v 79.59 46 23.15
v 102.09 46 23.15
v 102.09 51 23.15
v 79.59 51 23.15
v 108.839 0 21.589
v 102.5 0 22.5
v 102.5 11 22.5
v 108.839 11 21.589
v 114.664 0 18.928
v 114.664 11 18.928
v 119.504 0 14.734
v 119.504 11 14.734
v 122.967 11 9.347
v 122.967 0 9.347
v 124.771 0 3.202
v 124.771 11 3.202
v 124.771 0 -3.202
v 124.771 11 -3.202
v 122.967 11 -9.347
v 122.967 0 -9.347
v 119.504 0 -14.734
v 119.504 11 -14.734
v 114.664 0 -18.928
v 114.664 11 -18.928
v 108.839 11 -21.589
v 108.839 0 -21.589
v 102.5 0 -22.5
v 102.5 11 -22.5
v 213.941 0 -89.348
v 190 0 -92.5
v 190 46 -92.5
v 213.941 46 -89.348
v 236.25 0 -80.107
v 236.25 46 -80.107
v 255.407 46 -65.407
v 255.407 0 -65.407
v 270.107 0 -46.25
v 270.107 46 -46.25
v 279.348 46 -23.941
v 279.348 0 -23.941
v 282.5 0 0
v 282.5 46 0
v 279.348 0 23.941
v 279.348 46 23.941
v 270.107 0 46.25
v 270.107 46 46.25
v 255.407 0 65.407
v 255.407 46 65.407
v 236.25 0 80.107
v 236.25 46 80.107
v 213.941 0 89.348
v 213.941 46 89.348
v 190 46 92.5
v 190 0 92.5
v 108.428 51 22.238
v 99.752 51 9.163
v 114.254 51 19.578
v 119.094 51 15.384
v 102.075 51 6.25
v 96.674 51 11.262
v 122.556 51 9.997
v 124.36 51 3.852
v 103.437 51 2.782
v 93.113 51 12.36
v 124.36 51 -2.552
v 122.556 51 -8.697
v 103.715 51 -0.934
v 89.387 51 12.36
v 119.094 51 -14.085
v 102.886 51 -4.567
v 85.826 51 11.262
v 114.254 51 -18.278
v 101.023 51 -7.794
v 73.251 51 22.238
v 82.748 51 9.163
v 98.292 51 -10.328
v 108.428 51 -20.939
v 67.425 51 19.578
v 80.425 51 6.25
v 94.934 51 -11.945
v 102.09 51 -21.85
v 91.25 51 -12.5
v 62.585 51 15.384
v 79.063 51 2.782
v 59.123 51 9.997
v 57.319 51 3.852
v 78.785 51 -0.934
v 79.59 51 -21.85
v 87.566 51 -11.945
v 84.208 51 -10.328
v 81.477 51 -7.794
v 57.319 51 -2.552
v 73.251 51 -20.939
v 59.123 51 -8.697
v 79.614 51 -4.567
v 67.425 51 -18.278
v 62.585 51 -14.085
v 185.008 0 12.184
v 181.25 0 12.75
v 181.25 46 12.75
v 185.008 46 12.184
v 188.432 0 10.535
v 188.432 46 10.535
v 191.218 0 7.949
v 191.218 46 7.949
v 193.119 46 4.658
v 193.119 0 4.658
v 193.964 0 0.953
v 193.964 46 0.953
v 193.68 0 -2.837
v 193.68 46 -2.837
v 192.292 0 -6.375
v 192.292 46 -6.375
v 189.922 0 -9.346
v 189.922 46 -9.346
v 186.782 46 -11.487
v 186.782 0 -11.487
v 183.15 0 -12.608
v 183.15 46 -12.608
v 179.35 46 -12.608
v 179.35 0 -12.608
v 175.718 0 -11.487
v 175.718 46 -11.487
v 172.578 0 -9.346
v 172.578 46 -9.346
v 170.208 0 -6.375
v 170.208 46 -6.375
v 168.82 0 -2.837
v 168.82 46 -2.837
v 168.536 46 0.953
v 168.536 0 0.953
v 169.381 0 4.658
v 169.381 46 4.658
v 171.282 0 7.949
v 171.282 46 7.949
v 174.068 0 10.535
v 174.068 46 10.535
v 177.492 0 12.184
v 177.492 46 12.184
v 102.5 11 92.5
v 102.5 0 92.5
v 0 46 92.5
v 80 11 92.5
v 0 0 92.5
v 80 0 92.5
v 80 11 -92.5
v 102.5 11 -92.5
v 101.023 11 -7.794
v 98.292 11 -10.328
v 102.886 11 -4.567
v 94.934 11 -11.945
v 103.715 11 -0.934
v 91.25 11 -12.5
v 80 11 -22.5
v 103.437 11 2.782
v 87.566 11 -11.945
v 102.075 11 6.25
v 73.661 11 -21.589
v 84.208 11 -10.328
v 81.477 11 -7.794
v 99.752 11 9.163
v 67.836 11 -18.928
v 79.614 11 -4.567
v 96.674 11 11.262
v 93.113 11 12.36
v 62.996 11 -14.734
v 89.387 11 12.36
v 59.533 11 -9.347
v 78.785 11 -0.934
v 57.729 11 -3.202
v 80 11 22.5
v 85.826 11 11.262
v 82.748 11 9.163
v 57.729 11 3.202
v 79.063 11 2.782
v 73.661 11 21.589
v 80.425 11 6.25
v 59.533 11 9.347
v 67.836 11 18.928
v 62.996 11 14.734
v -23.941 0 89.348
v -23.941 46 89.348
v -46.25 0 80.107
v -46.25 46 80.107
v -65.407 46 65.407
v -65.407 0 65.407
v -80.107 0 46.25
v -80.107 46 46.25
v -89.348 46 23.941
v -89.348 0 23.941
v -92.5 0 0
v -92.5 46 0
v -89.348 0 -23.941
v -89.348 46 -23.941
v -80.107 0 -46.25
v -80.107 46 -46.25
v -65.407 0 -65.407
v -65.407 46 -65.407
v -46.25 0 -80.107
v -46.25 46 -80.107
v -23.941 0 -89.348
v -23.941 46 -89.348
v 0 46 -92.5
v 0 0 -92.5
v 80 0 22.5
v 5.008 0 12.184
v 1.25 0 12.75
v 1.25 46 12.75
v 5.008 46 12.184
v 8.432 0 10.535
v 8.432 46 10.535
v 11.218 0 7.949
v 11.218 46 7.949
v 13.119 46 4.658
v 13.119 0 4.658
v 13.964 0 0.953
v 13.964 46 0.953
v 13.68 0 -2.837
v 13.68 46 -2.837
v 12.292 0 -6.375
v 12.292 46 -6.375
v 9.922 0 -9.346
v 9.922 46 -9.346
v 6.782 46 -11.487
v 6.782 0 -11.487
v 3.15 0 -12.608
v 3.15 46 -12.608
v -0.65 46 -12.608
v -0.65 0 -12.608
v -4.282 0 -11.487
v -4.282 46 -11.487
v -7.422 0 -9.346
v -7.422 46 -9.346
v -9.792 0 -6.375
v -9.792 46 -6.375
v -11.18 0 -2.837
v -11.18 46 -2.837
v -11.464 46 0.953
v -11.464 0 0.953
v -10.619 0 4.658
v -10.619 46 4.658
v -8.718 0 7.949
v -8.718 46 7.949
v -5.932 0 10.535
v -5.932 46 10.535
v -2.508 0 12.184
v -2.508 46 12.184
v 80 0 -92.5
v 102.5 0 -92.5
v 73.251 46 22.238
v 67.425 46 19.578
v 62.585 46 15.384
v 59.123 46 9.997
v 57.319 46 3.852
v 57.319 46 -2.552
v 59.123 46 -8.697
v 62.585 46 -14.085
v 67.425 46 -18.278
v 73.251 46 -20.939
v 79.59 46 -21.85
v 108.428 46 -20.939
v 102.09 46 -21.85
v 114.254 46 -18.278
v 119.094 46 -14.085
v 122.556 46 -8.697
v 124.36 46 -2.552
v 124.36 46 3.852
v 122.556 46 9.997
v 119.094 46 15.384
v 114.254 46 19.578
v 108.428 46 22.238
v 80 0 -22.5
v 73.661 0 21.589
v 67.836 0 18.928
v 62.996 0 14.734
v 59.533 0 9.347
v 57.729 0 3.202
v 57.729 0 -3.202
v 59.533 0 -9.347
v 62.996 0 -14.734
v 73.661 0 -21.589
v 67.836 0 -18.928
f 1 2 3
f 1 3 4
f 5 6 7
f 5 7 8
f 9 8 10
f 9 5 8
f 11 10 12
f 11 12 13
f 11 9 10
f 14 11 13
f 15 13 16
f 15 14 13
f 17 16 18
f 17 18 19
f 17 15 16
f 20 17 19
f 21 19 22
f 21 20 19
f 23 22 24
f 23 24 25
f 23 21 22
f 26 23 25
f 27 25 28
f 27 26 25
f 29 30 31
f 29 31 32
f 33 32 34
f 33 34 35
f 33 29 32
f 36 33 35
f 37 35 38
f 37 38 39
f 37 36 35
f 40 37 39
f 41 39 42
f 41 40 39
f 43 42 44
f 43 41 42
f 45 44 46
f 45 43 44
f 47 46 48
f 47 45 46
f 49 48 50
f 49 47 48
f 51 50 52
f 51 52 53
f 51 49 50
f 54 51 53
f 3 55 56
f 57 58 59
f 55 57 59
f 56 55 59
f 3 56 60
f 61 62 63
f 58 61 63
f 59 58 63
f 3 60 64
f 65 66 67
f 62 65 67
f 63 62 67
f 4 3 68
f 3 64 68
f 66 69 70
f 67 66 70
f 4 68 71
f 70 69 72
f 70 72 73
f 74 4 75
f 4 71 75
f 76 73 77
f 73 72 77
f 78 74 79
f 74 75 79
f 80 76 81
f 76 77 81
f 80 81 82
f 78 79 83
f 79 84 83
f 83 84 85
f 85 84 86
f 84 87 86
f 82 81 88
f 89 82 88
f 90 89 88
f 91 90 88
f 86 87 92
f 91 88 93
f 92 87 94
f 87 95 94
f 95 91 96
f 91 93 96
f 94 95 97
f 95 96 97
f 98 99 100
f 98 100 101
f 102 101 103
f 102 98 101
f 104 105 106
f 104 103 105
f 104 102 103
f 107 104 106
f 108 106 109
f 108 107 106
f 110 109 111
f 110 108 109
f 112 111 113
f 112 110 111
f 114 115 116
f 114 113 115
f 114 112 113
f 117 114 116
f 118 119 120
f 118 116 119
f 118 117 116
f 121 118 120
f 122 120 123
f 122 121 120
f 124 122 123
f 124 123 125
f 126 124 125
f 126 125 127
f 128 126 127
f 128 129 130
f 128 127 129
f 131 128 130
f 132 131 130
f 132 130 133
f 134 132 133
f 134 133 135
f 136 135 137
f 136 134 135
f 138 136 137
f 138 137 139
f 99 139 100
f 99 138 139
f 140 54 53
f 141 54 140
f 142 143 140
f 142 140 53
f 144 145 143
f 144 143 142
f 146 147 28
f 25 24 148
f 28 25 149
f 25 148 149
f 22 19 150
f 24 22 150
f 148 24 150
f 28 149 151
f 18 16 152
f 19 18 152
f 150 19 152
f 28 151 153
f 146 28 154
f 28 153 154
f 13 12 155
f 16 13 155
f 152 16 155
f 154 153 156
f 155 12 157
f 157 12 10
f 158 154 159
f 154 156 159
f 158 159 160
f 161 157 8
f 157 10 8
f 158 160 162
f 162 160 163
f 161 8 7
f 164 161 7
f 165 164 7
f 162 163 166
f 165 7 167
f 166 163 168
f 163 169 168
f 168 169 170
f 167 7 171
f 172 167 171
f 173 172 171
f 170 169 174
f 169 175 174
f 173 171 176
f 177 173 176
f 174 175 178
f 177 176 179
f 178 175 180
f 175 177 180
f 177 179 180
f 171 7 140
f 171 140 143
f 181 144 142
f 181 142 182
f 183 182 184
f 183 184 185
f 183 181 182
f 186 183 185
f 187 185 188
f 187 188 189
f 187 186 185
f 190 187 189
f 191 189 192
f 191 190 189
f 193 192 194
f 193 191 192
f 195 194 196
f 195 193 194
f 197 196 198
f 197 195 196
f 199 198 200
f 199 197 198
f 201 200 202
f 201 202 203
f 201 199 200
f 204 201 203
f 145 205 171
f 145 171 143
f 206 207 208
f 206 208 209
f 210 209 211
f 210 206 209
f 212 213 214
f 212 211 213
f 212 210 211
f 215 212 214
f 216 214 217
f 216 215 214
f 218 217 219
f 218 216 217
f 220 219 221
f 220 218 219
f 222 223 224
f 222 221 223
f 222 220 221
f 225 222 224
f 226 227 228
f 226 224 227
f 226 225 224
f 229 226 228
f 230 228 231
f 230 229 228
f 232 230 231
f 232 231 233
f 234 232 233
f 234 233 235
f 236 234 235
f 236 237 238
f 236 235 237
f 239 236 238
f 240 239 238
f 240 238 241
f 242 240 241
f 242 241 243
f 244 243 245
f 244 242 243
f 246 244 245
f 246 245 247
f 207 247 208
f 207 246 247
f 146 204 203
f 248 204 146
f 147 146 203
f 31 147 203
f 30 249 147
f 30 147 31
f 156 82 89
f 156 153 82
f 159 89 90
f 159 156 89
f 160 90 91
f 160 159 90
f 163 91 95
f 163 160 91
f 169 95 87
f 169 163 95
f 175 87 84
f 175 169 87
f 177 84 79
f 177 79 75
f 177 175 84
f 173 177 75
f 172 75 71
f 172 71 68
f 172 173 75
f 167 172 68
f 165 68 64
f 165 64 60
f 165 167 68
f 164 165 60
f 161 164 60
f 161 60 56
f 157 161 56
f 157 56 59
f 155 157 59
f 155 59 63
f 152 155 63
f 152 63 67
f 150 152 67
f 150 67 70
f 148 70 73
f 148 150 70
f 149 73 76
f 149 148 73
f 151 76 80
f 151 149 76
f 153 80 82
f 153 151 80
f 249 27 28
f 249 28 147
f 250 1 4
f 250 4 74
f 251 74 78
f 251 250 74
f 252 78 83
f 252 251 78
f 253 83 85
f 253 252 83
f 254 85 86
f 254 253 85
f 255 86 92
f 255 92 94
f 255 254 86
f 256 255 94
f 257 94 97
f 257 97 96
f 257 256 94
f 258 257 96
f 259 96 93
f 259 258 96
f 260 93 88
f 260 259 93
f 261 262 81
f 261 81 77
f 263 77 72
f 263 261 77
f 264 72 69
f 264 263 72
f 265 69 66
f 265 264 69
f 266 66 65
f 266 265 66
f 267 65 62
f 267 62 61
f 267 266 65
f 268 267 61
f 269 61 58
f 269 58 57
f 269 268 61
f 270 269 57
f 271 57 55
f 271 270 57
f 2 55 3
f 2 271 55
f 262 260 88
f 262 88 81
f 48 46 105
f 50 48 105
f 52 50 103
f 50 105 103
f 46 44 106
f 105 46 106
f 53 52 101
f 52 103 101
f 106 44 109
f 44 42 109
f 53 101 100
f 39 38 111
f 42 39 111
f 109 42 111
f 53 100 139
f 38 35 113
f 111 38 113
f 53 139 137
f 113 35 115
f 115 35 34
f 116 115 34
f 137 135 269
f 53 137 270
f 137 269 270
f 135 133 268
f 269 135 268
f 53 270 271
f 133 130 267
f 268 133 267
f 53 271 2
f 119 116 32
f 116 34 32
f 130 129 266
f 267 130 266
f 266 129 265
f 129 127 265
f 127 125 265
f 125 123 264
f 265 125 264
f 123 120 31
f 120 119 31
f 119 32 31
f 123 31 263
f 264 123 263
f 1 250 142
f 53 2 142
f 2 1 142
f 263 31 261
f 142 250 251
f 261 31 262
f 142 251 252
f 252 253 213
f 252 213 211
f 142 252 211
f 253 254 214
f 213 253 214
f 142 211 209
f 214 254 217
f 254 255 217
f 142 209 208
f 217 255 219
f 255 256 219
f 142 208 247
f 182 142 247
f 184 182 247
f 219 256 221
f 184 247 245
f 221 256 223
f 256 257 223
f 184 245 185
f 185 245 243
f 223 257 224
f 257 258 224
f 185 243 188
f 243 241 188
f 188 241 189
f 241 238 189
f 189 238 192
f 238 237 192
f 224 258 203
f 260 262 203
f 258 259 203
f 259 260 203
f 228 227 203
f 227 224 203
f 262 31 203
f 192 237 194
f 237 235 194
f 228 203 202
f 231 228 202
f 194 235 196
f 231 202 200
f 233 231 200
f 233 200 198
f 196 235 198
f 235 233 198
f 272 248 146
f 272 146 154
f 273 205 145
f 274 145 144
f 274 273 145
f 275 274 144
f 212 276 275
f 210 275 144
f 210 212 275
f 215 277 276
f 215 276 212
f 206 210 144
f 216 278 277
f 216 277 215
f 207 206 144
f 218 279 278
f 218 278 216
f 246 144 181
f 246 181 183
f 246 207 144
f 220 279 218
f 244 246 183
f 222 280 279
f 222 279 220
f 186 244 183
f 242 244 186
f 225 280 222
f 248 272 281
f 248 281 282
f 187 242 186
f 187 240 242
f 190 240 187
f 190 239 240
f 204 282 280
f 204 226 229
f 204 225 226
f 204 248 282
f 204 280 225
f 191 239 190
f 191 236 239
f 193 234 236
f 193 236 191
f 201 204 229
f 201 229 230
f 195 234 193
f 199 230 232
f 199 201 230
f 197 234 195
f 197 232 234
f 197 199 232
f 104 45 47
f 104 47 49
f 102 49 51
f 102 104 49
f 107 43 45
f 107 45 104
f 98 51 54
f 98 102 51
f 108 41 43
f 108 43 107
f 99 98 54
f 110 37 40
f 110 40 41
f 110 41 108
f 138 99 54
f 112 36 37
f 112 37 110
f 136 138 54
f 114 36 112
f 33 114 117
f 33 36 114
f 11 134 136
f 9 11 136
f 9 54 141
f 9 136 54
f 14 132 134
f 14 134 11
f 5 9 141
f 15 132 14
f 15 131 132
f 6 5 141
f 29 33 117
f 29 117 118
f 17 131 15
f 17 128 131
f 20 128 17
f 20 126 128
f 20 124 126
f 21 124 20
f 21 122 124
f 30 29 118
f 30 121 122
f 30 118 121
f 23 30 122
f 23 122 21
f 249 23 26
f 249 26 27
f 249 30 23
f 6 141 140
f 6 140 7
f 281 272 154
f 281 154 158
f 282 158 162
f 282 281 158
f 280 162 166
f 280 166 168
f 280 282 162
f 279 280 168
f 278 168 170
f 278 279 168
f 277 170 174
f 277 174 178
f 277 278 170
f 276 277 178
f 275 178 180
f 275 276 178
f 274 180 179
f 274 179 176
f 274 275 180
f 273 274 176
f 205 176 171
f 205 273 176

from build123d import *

# Parameters (mm, degrees)
BOSS_EXTRUDE1_DEPTH     = 46
CUT_EXTRUDE1_DEPTH      = 11
SKETCH3_R               = 12.5
CUT_EXTRUDE2_DEPTH      = 300.311710429
SKETCH4_R               = 12.5
BOSS_EXTRUDE2_DEPTH     = 5
CUT_EXTRUDE3_DEPTH      = 301.796442798
CUT_EXTRUDE3_DEPTH_BACK = 301.796442798
SKETCH5_R               = 12.75


with BuildPart() as part:
    # Sketch1 → Boss-Extrude1 (new body)
    with BuildSketch(Plane(origin=(0, 0, 0), x_dir=(1, 0, 0), z_dir=(0, 1, 0))):
        with BuildLine():
            Line((0, 92.5), (190, 92.5))
            ThreePointArc((190, 92.5), (282.5, 0), (190, -92.5))
            Line((190, -92.5), (0, -92.5))
            ThreePointArc((0, -92.5), (-92.5, 0), (0, 92.5))
        make_face()
    extrude(amount=BOSS_EXTRUDE1_DEPTH)

    # Sketch2 → Cut-Extrude1 (cut)
    with BuildSketch(Plane.XZ):
        with BuildLine():
            Line((80, -92.5), (80, -22.5))
            ThreePointArc((80, -22.5), (57.5, 0), (80, 22.5))
            Line((80, 22.5), (80, 92.5))
            Line((80, 92.5), (102.5, 92.5))
            Line((102.5, 92.5), (102.5, 22.5))
            ThreePointArc((102.5, 22.5), (125, 0), (102.5, -22.5))
            Line((102.5, -22.5), (102.5, -92.5))
            Line((102.5, -92.5), (80, -92.5))
        make_face()
    extrude(amount=-CUT_EXTRUDE1_DEPTH, mode=Mode.SUBTRACT)

    # Sketch3 → Cut-Extrude2 (cut, through all)
    with BuildSketch(Plane.XZ.offset(-11)):
        with Locations(Location((91.25, 0, 0), (0, 0, 270))):
            Circle(SKETCH3_R)
    extrude(amount=-CUT_EXTRUDE2_DEPTH, mode=Mode.SUBTRACT)

    # Sketch4 → Boss-Extrude2 (add)
    with BuildSketch(Plane(origin=(0, 46, 0), x_dir=(1, 0, 0), z_dir=(0, 1, 0))):
        with BuildLine():
            ThreePointArc((102.089515, 21.8501808), (124.589515, -0.6498192), (102.089515, -23.1498192))
            Line((102.089515, -23.1498192), (79.589515, -23.1498192))
            ThreePointArc((79.589515, -23.1498192), (57.089515, -0.6498192), (79.589515, 21.8501808))
            Line((79.589515, 21.8501808), (102.089515, 21.8501808))
        make_face()
        with Locations(Location((91.25, 0, 0), (0, 0, 90))):
            Circle(SKETCH4_R, mode=Mode.SUBTRACT)
    extrude(amount=BOSS_EXTRUDE2_DEPTH)

    # Sketch5 → Cut-Extrude3 (cut, two sides: drawn at the far end of the back side and taken through both)
    with BuildSketch(Plane(origin=(0, 46, 0), x_dir=(1, 0, 0), z_dir=(0, 1, 0)).offset(-CUT_EXTRUDE3_DEPTH_BACK)):
        with Locations(Location((1.25, 0, 0), (0, 0, 270))):
            Circle(SKETCH5_R)
        with Locations(Location((181.25, 0, 0), (0, 0, 270))):
            Circle(SKETCH5_R)
    extrude(amount=CUT_EXTRUDE3_DEPTH + CUT_EXTRUDE3_DEPTH_BACK, mode=Mode.SUBTRACT)


solid = part.part
